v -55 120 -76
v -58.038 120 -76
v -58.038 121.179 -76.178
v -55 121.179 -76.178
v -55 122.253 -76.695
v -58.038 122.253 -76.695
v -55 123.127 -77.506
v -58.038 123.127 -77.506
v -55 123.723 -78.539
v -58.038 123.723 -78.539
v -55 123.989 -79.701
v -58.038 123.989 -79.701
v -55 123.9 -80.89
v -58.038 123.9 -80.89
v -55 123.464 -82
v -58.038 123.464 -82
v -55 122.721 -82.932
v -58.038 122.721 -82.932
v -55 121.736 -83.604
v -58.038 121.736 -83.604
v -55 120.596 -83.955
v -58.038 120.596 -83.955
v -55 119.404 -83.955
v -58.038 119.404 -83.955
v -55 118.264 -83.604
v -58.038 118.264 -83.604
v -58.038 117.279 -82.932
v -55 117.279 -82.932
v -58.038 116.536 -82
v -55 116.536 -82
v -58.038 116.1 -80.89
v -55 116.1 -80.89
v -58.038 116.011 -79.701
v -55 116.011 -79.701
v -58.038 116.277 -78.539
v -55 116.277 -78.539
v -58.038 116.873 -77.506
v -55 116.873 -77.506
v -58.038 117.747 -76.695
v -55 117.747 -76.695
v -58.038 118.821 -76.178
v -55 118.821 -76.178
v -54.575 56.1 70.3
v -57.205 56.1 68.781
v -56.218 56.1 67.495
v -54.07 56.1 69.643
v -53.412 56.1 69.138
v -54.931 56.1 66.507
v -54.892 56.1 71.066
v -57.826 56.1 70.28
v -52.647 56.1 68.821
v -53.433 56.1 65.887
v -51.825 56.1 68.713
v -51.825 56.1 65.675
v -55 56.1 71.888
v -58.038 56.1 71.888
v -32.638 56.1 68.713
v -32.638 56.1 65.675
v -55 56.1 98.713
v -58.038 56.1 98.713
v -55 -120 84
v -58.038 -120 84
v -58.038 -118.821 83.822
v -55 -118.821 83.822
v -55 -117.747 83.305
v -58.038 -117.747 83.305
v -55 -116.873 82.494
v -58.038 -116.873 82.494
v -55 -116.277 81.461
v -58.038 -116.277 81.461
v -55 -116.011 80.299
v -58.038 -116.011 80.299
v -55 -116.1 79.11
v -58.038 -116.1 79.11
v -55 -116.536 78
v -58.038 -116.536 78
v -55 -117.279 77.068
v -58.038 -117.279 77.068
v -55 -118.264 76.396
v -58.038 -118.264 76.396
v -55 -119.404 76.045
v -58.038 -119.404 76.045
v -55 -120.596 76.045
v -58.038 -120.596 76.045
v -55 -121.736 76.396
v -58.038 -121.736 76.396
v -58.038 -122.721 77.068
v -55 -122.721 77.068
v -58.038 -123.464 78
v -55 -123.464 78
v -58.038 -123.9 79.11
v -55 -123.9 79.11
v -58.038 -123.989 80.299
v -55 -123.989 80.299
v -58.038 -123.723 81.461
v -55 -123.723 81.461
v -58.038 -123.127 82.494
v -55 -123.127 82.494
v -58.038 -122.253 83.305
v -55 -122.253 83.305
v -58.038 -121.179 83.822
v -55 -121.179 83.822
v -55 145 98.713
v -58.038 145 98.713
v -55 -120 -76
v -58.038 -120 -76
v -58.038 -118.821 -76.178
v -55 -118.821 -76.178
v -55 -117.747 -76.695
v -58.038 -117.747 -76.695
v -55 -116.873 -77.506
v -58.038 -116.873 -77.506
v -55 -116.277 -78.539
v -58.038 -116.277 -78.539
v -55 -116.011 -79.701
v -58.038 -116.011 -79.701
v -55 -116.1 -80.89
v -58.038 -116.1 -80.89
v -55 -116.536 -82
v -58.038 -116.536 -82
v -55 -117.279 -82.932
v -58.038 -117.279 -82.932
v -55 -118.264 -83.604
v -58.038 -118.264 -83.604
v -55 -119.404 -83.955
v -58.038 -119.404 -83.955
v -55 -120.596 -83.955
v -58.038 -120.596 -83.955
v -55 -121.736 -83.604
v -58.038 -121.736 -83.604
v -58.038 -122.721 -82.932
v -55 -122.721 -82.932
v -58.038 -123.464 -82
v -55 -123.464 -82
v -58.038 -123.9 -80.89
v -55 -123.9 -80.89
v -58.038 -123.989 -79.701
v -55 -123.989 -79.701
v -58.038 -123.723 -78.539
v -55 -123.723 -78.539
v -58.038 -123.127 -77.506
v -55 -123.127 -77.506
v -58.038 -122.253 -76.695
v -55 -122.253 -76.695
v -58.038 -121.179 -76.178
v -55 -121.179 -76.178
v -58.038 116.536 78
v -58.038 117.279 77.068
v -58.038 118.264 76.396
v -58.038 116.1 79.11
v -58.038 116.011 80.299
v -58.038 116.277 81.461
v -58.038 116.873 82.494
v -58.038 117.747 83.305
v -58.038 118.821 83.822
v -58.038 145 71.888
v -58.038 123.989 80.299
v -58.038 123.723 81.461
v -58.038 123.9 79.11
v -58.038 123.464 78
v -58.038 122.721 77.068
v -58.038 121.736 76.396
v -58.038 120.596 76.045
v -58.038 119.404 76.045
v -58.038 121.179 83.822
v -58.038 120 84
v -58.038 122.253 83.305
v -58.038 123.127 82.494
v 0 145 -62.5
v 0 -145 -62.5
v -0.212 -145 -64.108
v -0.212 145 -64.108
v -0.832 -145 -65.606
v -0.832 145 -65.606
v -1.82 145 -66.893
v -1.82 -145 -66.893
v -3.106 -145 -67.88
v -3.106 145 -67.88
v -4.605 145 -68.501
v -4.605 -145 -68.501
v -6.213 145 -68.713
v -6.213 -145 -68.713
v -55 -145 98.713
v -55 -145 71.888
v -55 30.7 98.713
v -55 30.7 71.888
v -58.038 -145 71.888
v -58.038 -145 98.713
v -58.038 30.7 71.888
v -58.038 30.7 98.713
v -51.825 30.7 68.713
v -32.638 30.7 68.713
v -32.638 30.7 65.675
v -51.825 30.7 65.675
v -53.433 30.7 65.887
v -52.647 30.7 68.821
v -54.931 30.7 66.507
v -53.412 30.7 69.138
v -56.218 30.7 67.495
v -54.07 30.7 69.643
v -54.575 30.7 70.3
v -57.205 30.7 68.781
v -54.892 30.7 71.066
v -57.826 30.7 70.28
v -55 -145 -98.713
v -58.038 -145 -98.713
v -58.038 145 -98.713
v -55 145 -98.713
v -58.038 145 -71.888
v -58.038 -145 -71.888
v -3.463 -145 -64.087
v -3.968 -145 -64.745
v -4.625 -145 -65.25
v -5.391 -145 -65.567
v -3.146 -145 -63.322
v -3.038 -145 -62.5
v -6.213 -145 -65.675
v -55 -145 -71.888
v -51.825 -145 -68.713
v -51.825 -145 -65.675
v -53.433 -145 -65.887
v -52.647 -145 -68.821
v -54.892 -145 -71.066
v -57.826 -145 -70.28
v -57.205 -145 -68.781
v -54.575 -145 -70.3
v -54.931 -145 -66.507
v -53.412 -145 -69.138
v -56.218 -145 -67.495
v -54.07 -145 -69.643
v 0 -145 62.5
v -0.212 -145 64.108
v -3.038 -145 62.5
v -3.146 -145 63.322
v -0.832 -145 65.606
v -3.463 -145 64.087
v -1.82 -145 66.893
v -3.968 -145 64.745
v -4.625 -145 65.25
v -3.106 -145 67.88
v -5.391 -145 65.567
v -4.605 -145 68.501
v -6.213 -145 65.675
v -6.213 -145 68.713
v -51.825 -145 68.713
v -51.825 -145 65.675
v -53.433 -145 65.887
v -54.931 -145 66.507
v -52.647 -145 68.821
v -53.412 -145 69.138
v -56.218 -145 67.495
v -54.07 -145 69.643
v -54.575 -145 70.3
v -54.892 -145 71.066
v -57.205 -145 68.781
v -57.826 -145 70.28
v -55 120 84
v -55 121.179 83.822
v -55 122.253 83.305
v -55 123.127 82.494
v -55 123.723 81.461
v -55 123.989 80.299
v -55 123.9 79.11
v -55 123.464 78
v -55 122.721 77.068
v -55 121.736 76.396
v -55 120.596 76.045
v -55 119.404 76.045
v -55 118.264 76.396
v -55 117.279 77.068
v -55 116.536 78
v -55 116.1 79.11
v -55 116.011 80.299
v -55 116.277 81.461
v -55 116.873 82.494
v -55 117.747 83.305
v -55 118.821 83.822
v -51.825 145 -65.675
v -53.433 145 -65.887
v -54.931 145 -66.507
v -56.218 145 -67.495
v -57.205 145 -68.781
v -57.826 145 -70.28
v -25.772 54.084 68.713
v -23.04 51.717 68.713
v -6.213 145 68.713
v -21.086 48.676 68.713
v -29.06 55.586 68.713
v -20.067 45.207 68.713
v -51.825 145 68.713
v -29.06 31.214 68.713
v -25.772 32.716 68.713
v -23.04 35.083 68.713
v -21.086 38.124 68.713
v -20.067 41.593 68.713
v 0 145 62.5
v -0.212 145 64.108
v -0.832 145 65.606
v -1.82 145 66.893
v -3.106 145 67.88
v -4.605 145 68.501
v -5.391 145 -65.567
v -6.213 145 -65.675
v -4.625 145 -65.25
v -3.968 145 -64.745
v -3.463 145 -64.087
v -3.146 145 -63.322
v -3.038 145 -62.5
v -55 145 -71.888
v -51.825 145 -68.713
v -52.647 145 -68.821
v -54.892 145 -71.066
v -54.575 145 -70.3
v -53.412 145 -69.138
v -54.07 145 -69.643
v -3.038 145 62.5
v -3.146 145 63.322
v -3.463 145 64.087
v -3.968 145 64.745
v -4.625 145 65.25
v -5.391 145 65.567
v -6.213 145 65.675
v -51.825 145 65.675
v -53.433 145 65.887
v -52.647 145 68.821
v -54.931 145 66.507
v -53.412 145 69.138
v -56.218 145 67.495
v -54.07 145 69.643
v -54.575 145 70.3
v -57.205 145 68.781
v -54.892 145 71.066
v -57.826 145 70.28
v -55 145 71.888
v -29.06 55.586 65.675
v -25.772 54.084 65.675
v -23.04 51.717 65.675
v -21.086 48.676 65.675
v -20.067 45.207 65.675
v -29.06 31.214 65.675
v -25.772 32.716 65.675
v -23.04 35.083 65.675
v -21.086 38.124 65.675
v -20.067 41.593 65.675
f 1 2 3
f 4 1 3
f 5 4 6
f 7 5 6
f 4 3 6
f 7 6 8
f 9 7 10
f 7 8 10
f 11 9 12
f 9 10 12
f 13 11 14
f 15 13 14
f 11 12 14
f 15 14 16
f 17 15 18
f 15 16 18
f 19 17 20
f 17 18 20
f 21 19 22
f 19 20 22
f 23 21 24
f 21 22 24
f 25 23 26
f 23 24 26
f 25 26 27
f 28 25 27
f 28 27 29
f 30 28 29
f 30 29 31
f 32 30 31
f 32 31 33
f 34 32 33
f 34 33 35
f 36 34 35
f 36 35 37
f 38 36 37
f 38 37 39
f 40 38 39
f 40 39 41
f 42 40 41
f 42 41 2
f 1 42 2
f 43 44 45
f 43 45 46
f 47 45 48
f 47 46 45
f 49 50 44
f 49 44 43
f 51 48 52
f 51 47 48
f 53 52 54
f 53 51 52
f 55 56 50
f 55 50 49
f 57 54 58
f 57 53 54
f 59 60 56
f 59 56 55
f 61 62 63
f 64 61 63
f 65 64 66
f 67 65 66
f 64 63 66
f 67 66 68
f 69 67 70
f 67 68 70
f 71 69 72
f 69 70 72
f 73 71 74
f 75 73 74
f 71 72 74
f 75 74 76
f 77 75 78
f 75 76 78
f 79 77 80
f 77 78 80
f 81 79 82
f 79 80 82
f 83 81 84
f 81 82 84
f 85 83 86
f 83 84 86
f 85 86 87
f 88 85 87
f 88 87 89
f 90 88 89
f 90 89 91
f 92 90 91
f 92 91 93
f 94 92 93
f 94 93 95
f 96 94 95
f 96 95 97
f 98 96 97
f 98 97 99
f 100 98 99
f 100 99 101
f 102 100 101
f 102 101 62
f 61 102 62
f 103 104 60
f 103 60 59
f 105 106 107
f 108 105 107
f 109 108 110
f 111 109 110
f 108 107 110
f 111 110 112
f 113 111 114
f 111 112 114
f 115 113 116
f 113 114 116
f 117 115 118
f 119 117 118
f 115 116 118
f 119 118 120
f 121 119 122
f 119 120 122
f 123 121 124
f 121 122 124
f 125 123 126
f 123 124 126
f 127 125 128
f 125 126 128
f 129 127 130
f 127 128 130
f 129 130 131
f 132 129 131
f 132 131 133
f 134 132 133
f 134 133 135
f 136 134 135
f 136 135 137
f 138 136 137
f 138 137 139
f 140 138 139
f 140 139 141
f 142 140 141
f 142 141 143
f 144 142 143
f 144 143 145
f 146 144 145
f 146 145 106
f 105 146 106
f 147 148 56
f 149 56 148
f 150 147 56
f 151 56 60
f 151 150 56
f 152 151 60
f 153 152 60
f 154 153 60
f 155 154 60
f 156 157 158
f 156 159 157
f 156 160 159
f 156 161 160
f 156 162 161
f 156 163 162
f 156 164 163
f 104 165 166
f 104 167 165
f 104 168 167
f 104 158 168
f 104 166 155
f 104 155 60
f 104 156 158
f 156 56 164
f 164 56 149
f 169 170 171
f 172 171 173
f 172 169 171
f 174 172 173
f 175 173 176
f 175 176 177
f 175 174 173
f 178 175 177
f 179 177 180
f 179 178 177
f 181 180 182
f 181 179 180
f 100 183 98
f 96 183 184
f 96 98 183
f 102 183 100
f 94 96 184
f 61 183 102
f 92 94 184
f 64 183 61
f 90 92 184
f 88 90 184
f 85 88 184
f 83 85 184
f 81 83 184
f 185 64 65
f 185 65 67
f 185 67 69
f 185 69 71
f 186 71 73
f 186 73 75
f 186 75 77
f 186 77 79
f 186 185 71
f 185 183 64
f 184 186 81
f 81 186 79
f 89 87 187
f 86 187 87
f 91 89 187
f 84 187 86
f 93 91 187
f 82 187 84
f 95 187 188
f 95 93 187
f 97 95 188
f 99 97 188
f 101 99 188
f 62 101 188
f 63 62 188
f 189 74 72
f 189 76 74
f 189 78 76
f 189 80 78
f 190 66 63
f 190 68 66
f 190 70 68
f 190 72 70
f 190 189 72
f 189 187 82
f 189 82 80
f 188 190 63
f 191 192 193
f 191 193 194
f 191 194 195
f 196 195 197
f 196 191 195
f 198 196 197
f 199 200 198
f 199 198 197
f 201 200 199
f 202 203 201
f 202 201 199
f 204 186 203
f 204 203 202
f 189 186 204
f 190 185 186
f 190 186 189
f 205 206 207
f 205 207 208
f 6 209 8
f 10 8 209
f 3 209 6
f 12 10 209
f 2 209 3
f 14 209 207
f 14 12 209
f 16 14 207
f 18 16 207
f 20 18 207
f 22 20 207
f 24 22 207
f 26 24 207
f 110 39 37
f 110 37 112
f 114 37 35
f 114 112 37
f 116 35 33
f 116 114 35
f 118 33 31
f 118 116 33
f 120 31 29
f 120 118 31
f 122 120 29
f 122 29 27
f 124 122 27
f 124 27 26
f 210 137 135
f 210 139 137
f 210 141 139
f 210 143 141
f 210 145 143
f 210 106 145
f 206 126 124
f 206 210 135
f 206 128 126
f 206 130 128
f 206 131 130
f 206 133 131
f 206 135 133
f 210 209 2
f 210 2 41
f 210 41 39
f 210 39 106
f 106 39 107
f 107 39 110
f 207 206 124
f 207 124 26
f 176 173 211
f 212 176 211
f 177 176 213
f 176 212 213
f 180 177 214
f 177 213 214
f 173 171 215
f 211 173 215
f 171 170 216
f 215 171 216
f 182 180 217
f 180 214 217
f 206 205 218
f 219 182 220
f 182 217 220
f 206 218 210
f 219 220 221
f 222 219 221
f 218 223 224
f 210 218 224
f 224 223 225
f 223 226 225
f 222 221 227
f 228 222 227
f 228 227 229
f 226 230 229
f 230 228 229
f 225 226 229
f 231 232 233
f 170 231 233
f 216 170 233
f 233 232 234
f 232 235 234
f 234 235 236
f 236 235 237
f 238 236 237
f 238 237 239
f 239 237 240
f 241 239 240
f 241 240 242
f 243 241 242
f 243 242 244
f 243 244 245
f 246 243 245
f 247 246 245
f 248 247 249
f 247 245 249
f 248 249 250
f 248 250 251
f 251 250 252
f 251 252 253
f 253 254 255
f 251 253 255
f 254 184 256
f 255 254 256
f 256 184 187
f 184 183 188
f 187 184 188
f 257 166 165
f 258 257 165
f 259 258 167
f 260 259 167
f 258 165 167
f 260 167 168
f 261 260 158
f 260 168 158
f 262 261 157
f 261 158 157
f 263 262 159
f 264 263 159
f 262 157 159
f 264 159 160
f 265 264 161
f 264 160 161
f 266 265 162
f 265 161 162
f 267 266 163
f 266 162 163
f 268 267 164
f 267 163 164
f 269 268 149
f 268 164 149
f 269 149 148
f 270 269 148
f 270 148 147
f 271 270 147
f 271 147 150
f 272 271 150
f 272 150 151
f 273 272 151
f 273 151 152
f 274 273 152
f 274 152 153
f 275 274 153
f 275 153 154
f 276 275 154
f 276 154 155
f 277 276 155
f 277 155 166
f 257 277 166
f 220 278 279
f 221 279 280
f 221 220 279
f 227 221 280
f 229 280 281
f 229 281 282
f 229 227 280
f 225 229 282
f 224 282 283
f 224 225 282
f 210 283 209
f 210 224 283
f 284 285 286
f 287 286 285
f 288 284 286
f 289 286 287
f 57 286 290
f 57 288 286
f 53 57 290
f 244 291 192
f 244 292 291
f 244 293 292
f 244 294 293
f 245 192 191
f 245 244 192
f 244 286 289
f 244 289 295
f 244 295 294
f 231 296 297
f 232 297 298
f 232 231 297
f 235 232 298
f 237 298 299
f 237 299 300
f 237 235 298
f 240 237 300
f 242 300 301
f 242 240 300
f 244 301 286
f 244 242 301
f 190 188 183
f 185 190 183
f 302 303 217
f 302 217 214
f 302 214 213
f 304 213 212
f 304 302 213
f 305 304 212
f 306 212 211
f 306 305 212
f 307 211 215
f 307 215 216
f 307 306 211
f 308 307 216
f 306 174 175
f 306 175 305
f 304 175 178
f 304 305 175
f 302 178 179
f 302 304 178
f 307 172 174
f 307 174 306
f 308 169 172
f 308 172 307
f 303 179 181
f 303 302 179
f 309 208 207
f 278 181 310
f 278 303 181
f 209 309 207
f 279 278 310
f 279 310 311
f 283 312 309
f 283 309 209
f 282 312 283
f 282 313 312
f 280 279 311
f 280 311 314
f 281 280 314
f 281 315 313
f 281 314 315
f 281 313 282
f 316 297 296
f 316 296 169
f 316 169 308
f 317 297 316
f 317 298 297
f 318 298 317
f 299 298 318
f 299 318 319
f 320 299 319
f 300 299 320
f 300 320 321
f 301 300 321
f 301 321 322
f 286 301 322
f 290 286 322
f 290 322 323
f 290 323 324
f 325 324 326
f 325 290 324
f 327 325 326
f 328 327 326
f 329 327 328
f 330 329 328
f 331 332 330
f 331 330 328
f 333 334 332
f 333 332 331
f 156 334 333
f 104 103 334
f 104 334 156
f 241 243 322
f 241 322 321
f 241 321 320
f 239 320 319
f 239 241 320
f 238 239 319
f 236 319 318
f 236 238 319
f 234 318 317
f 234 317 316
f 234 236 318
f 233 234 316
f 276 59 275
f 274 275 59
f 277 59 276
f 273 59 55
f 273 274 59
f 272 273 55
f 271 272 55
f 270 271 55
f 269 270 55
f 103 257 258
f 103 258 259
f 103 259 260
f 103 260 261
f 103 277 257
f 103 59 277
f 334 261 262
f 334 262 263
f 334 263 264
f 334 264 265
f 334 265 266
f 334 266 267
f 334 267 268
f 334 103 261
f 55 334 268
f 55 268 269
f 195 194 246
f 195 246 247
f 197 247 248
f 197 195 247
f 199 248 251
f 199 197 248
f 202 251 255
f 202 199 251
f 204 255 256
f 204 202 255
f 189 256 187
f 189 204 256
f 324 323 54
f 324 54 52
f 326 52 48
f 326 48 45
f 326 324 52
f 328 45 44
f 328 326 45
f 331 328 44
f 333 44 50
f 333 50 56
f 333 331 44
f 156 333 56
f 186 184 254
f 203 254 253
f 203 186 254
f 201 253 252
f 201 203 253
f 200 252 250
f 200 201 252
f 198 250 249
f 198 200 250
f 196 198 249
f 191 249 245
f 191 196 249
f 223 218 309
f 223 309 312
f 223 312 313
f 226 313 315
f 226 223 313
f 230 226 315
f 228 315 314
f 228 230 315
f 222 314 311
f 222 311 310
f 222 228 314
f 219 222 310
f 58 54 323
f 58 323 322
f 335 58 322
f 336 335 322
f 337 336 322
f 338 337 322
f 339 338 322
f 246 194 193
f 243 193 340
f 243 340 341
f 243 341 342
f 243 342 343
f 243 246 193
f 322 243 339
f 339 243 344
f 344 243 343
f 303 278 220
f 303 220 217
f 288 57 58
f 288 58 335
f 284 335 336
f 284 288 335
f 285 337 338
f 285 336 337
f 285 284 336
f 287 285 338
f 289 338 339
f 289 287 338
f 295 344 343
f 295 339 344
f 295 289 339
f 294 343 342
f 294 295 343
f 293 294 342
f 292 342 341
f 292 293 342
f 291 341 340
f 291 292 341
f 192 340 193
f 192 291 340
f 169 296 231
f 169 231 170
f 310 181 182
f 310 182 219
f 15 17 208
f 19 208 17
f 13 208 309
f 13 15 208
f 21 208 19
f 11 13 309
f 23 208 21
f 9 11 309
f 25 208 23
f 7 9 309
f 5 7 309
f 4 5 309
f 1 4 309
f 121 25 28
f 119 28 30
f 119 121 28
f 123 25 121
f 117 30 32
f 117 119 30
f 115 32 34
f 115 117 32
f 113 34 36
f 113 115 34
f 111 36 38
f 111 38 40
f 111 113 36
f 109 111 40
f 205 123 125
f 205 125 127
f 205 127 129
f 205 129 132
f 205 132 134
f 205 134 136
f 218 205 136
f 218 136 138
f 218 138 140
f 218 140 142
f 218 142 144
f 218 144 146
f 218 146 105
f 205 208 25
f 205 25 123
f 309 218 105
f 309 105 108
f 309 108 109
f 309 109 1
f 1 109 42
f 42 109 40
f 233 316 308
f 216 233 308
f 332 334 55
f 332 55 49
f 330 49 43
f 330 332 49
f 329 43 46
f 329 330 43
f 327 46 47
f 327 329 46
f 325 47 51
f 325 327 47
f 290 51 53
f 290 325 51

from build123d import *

# Parameters (mm, degrees)
SKETCH1_W                      = 125
SKETCH1_H                      = 290
BASE_FLANGE1_DEPTH             = 3.03784
EDGE_FLANGE1_DEPTH             = 290
EDGE_FLANGE1_BEND_DEPTH        = 290
EDGE_FLANGE2_STRIP_W           = 18.50136
EDGE_FLANGE2_STRIP_H           = 3.03784
EDGE_FLANGE2_STRIP_CUT_DEPTH   = 290
EDGE_FLANGE2_STRIP_2_W         = 18.50136
EDGE_FLANGE2_STRIP_2_H         = 3.03784
EDGE_FLANGE2_STRIP_CUT_2_DEPTH = 290
EDGE_FLANGE2_DEPTH             = 290
EDGE_FLANGE2_BEND_DEPTH        = 290
M6_CLEARANCE_HOLE1_D           = 8
CUT_EXTRUDE1_DEPTH             = 50


# Sheet-metal steps are written as plain solids
with BuildPart() as part:
    # Sketch1 → Base-Flange1 (new body)
    with BuildSketch(Plane(origin=(0, 0, 0), x_dir=(0, 0, -1), z_dir=(1, 0, 0))):
        Rectangle(SKETCH1_W, SKETCH1_H)
    extrude(amount=-BASE_FLANGE1_DEPTH)

    # Edge-Flange1 section (across the edge) → Edge-Flange1 (add)
    with BuildSketch(Plane(origin=(-3.03784, -145, 65.675), x_dir=(0, 0, -1), z_dir=(0, 1, 0))):
        with BuildLine():
            Line((-3.03784, 3.175), (-3.03784, 55))
            Line((-3.03784, 55), (0, 55))
            Line((0, 55), (0, 3.175))
            ThreePointArc((0, 3.175), (0.92993597, 0.92993597), (3.175, 0))
            Line((3.175, 0), (3.175, -3.03784))
            ThreePointArc((3.175, -3.03784), (-1.218141294, -1.218141294), (-3.03784, 3.175))
        make_face()
    extrude(amount=EDGE_FLANGE1_DEPTH)

    # Edge-Flange1 section 2 (across the edge) → Edge-Flange1 bend (add)
    with BuildSketch(Plane(origin=(-3.03784, 145, -65.675), x_dir=(0, 0, 1), z_dir=(0, -1, 0))):
        with BuildLine():
            Line((-3.03784, 3.175), (-3.03784, 55))
            Line((-3.03784, 55), (0, 55))
            Line((0, 55), (0, 3.175))
            ThreePointArc((0, 3.175), (0.92993597, 0.92993597), (3.175, 0))
            Line((3.175, 0), (3.175, -3.03784))
            ThreePointArc((3.175, -3.03784), (-1.218141294, -1.218141294), (-3.03784, 3.175))
        make_face()
    extrude(amount=EDGE_FLANGE1_BEND_DEPTH)

    # Edge-Flange2 strip (across the edge) → Edge-Flange2 strip cut (cut)
    with BuildSketch(Plane(origin=(-58.03784, -145, -68.71284), x_dir=(1, 0, 0), z_dir=(0, 1, 0))):
        with Locations((-3.03784, -1.51892)):
            Rectangle(EDGE_FLANGE2_STRIP_W, EDGE_FLANGE2_STRIP_H)
    extrude(amount=EDGE_FLANGE2_STRIP_CUT_DEPTH, mode=Mode.SUBTRACT)

    # Edge-Flange2 strip 2 (across the edge) → Edge-Flange2 strip cut 2 (cut)
    with BuildSketch(Plane(origin=(-58.03784, 145, 68.71284), x_dir=(1, 0, 0), z_dir=(0, -1, 0))):
        with Locations((-3.03784, -1.51892)):
            Rectangle(EDGE_FLANGE2_STRIP_2_W, EDGE_FLANGE2_STRIP_2_H)
    extrude(amount=EDGE_FLANGE2_STRIP_CUT_2_DEPTH, mode=Mode.SUBTRACT)

    # Edge-Flange2 section (across the edge) → Edge-Flange2 (add)
    with BuildSketch(Plane(origin=(-58.03784, -145, -68.71284), x_dir=(1, 0, 0), z_dir=(0, 1, 0))):
        with BuildLine():
            Line((0, 3.175), (0, 30))
            Line((0, 30), (3.03784, 30))
            Line((3.03784, 30), (3.03784, 3.175))
            ThreePointArc((3.03784, 3.175), (3.96777597, 0.92993597), (6.21284, 0))
            Line((6.21284, 0), (6.21284, -3.03784))
            ThreePointArc((6.21284, -3.03784), (1.819698706, -1.218141294), (0, 3.175))
        make_face()
    extrude(amount=EDGE_FLANGE2_DEPTH)

    # Edge-Flange2 section 2 (across the edge) → Edge-Flange2 bend (add)
    with BuildSketch(Plane(origin=(-58.03784, 145, 68.71284), x_dir=(1, 0, 0), z_dir=(0, -1, 0))):
        with BuildLine():
            Line((0, 3.175), (0, 30))
            Line((0, 30), (3.03784, 30))
            Line((3.03784, 30), (3.03784, 3.175))
            ThreePointArc((3.03784, 3.175), (3.96777597, 0.92993597), (6.21284, 0))
            Line((6.21284, 0), (6.21284, -3.03784))
            ThreePointArc((6.21284, -3.03784), (1.819698706, -1.218141294), (0, 3.175))
        make_face()
    extrude(amount=EDGE_FLANGE2_BEND_DEPTH)

    # M6 Clearance Hole1 (through all)
    with Locations(Plane(origin=(-55, 0, 0), x_dir=(0, 0, -1), z_dir=(1, 0, 0))):
        with Locations((-80, 120), (80, 120), (80, -120), (-80, -120)):
            Hole(M6_CLEARANCE_HOLE1_D / 2)

    # Sketch20 → Cut-Extrude1 (cut)
    with BuildSketch(Plane.XY.offset(98.71284)):
        with BuildLine():
            Line((-58.03784, 56.1), (-32.63784, 56.1))
            ThreePointArc((-32.63784, 56.1), (-19.93784, 43.4), (-32.63784, 30.7))
            Line((-32.63784, 30.7), (-58.03784, 30.7))
            Line((-58.03784, 30.7), (-58.03784, 56.1))
        make_face()
    extrude(amount=-CUT_EXTRUDE1_DEPTH, mode=Mode.SUBTRACT)


solid = part.part
